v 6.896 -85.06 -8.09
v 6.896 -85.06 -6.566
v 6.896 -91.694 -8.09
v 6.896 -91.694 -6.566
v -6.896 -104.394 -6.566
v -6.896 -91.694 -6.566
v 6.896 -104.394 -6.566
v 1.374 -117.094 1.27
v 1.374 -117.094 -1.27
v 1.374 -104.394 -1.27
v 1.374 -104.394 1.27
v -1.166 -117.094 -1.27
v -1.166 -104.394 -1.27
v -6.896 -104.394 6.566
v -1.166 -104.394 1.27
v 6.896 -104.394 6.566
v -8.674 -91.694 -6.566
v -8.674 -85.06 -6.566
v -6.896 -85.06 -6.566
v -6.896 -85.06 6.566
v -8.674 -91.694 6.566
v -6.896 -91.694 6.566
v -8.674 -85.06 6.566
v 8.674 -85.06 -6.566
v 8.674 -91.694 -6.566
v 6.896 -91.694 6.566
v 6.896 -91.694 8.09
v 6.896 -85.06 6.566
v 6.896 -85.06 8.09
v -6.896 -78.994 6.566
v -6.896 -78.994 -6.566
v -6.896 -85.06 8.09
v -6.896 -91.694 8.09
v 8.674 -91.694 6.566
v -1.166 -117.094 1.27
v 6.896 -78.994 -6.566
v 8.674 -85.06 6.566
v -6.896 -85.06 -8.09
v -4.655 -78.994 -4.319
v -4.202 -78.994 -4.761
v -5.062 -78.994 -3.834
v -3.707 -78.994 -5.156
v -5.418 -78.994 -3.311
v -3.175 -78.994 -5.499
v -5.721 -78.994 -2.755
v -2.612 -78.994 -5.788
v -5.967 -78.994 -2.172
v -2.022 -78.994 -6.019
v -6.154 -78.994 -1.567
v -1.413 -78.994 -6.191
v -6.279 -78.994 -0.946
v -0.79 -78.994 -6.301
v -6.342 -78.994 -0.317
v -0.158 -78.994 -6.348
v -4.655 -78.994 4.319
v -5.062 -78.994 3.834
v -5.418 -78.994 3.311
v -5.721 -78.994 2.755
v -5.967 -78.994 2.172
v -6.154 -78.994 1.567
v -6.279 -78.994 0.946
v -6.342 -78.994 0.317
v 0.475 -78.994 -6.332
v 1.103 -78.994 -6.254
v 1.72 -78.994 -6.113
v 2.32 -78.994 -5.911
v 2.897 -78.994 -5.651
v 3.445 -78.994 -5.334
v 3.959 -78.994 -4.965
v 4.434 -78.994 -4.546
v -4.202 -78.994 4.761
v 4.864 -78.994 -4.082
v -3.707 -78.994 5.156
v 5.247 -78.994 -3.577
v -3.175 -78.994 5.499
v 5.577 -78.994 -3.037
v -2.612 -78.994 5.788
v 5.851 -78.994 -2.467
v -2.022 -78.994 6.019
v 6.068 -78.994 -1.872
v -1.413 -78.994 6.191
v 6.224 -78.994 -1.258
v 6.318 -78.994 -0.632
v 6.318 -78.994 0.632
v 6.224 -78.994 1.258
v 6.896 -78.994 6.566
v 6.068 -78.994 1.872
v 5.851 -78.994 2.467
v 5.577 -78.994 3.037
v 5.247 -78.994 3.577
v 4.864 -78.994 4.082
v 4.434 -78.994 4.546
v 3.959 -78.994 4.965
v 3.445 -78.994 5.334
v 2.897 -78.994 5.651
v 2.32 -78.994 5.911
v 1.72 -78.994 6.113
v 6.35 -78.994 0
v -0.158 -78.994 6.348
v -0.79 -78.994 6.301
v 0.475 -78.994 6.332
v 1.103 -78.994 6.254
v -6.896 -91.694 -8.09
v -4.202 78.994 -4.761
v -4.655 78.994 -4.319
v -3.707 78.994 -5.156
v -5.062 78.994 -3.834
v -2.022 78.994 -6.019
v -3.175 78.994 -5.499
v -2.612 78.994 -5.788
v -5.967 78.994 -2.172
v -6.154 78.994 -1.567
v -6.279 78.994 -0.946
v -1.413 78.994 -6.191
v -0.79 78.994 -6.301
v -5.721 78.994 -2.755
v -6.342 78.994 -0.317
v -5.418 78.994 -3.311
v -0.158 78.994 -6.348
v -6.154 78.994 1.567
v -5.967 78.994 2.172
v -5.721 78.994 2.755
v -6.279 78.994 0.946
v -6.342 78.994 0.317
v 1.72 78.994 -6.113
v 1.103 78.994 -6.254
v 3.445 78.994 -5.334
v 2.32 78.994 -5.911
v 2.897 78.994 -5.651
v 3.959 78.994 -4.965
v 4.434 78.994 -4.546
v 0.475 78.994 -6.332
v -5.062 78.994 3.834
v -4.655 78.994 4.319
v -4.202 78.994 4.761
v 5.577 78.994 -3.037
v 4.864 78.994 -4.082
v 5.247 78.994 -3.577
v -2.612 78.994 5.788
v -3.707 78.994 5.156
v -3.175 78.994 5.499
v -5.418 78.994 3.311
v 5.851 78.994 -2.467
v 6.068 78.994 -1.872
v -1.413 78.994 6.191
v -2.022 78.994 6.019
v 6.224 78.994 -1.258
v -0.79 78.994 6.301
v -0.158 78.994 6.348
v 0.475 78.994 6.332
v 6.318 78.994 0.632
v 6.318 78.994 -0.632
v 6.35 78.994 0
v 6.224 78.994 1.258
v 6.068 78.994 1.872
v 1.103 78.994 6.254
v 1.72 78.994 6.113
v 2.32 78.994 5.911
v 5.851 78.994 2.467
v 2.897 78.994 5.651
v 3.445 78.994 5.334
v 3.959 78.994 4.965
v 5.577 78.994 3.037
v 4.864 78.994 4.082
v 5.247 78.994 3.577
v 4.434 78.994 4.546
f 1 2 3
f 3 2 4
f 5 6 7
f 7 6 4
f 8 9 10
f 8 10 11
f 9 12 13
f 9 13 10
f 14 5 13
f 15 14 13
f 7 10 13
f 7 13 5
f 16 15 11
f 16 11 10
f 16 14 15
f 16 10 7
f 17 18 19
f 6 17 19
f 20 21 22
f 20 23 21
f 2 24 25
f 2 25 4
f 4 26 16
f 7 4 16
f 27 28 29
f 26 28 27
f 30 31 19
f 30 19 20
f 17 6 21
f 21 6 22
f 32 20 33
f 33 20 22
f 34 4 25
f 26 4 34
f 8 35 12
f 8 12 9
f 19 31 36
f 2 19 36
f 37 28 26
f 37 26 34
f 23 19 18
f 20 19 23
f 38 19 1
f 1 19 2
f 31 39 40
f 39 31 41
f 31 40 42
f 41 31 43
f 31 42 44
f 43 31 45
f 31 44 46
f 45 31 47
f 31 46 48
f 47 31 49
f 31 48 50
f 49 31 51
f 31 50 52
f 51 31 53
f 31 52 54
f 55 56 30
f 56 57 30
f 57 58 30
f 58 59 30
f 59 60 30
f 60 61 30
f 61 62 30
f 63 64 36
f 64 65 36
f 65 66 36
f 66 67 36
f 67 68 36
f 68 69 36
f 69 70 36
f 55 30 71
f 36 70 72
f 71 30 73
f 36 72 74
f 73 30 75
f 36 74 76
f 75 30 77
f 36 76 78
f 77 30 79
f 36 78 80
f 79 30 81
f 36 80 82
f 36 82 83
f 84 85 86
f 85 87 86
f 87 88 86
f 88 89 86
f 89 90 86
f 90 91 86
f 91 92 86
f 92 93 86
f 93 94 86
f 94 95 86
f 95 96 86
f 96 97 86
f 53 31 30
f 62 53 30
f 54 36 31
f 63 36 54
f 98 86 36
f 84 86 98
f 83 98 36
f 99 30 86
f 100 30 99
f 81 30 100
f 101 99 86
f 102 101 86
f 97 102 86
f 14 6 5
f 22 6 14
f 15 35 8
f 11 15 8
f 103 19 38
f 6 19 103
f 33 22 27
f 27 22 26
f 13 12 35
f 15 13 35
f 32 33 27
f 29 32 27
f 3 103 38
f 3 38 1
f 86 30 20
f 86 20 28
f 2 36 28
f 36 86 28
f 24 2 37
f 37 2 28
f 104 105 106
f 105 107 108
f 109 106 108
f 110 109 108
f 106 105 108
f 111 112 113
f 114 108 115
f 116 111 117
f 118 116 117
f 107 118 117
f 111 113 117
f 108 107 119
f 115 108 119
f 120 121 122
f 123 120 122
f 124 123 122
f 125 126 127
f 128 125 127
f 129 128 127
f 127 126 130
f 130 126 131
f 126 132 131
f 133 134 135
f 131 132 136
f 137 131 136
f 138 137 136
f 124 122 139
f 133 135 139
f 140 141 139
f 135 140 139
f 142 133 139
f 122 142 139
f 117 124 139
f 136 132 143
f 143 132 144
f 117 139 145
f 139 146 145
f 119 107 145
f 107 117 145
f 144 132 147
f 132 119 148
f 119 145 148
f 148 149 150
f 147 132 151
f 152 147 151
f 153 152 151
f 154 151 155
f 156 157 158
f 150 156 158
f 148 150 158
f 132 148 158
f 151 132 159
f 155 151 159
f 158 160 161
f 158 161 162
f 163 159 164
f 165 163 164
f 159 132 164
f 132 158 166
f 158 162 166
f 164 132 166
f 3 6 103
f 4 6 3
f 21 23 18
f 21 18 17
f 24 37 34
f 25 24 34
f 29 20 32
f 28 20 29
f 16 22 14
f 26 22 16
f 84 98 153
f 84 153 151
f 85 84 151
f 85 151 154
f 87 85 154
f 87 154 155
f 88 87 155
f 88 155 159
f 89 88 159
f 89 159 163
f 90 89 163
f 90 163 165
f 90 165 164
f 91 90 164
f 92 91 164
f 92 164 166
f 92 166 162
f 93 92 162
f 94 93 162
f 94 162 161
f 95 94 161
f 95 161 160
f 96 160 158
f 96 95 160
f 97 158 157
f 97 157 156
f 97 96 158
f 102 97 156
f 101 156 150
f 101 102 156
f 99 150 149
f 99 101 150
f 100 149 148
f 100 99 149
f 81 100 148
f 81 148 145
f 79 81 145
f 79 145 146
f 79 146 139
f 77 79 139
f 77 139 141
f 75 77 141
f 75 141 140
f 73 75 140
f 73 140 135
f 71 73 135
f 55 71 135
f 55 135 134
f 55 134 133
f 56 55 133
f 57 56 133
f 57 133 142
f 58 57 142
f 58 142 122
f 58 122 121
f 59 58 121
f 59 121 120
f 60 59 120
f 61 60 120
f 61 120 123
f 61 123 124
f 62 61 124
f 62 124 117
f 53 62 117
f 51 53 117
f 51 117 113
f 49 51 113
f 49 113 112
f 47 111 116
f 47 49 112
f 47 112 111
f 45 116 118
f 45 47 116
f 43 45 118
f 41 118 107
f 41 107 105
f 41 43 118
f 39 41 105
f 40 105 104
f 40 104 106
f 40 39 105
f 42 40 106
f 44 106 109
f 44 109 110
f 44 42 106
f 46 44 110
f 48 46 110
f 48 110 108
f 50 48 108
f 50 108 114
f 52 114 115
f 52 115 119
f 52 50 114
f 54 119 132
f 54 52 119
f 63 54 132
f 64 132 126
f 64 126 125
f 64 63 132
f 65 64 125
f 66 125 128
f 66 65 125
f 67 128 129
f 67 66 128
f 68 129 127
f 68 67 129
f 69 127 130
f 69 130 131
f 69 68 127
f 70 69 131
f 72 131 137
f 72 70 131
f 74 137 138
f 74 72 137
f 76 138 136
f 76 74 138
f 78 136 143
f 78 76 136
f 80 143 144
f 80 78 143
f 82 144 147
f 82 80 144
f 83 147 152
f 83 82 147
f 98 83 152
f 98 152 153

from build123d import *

# Parameters (mm, degrees)
F0_R      = 6.35
F1_DEPTH  = 78.994
F3_W      = 13.791928
F3_H      = 13.131412
F4_DEPTH  = 25.4
F5_W      = 6.633806
F5_H      = 13.131412
F6_DEPTH  = 1.778
F7_W      = 13.791928
F7_H      = 6.633806
F8_DEPTH  = 1.524
F11_W     = 2.54
F11_H     = 2.54
F12_DEPTH = 12.7


with BuildPart() as f1:
    # F0 (on Front) → F1 (new body)
    with BuildSketch(Plane.XZ):
        Circle(F0_R)
    extrude(amount=F1_DEPTH)

    # F2: F1 across plane


with BuildPart() as f1_1:
    add(f1.part)
    add(f1.part.mirror(Plane.XZ))

    # F3 (on face) → F4 (join)
    with BuildSketch(Plane.XZ.offset(78.994)):
        Rectangle(F3_W, F3_H)
    extrude(amount=F4_DEPTH)

    # F5 (on face) → F6 (join)
    with BuildSketch(Plane(origin=(-6.895964, 0, 0), x_dir=(0, -1, 0), z_dir=(-1, 0, 0))):
        with Locations((88.377097, 0)):
            Rectangle(F5_W, F5_H)
    extrude(amount=F6_DEPTH)

    # F7 (on face) → F8 (join)
    with BuildSketch(Plane(origin=(0, 0, -6.565706), x_dir=(1, 0, 0), z_dir=(0, 0, -1))):
        with Locations((0, 88.377097)):
            Rectangle(F7_W, F7_H)
    extrude(amount=F8_DEPTH)

    # F9: F1 across plane


with BuildPart() as f1_2:
    add(f1_1.part)
    add(f1_1.part.mirror(Plane.YZ))

    # F10: F1 across plane


with BuildPart() as f1_3:
    add(f1_2.part)
    add(f1_2.part.mirror(Plane.XY))

    # F11 (on face) → F12 (join)
    with BuildSketch(Plane.XZ.offset(104.394)):
        with Locations((0.104479, 0.000465)):
            Rectangle(F11_W, F11_H)
    extrude(amount=F12_DEPTH)


solid = f1_3.part
